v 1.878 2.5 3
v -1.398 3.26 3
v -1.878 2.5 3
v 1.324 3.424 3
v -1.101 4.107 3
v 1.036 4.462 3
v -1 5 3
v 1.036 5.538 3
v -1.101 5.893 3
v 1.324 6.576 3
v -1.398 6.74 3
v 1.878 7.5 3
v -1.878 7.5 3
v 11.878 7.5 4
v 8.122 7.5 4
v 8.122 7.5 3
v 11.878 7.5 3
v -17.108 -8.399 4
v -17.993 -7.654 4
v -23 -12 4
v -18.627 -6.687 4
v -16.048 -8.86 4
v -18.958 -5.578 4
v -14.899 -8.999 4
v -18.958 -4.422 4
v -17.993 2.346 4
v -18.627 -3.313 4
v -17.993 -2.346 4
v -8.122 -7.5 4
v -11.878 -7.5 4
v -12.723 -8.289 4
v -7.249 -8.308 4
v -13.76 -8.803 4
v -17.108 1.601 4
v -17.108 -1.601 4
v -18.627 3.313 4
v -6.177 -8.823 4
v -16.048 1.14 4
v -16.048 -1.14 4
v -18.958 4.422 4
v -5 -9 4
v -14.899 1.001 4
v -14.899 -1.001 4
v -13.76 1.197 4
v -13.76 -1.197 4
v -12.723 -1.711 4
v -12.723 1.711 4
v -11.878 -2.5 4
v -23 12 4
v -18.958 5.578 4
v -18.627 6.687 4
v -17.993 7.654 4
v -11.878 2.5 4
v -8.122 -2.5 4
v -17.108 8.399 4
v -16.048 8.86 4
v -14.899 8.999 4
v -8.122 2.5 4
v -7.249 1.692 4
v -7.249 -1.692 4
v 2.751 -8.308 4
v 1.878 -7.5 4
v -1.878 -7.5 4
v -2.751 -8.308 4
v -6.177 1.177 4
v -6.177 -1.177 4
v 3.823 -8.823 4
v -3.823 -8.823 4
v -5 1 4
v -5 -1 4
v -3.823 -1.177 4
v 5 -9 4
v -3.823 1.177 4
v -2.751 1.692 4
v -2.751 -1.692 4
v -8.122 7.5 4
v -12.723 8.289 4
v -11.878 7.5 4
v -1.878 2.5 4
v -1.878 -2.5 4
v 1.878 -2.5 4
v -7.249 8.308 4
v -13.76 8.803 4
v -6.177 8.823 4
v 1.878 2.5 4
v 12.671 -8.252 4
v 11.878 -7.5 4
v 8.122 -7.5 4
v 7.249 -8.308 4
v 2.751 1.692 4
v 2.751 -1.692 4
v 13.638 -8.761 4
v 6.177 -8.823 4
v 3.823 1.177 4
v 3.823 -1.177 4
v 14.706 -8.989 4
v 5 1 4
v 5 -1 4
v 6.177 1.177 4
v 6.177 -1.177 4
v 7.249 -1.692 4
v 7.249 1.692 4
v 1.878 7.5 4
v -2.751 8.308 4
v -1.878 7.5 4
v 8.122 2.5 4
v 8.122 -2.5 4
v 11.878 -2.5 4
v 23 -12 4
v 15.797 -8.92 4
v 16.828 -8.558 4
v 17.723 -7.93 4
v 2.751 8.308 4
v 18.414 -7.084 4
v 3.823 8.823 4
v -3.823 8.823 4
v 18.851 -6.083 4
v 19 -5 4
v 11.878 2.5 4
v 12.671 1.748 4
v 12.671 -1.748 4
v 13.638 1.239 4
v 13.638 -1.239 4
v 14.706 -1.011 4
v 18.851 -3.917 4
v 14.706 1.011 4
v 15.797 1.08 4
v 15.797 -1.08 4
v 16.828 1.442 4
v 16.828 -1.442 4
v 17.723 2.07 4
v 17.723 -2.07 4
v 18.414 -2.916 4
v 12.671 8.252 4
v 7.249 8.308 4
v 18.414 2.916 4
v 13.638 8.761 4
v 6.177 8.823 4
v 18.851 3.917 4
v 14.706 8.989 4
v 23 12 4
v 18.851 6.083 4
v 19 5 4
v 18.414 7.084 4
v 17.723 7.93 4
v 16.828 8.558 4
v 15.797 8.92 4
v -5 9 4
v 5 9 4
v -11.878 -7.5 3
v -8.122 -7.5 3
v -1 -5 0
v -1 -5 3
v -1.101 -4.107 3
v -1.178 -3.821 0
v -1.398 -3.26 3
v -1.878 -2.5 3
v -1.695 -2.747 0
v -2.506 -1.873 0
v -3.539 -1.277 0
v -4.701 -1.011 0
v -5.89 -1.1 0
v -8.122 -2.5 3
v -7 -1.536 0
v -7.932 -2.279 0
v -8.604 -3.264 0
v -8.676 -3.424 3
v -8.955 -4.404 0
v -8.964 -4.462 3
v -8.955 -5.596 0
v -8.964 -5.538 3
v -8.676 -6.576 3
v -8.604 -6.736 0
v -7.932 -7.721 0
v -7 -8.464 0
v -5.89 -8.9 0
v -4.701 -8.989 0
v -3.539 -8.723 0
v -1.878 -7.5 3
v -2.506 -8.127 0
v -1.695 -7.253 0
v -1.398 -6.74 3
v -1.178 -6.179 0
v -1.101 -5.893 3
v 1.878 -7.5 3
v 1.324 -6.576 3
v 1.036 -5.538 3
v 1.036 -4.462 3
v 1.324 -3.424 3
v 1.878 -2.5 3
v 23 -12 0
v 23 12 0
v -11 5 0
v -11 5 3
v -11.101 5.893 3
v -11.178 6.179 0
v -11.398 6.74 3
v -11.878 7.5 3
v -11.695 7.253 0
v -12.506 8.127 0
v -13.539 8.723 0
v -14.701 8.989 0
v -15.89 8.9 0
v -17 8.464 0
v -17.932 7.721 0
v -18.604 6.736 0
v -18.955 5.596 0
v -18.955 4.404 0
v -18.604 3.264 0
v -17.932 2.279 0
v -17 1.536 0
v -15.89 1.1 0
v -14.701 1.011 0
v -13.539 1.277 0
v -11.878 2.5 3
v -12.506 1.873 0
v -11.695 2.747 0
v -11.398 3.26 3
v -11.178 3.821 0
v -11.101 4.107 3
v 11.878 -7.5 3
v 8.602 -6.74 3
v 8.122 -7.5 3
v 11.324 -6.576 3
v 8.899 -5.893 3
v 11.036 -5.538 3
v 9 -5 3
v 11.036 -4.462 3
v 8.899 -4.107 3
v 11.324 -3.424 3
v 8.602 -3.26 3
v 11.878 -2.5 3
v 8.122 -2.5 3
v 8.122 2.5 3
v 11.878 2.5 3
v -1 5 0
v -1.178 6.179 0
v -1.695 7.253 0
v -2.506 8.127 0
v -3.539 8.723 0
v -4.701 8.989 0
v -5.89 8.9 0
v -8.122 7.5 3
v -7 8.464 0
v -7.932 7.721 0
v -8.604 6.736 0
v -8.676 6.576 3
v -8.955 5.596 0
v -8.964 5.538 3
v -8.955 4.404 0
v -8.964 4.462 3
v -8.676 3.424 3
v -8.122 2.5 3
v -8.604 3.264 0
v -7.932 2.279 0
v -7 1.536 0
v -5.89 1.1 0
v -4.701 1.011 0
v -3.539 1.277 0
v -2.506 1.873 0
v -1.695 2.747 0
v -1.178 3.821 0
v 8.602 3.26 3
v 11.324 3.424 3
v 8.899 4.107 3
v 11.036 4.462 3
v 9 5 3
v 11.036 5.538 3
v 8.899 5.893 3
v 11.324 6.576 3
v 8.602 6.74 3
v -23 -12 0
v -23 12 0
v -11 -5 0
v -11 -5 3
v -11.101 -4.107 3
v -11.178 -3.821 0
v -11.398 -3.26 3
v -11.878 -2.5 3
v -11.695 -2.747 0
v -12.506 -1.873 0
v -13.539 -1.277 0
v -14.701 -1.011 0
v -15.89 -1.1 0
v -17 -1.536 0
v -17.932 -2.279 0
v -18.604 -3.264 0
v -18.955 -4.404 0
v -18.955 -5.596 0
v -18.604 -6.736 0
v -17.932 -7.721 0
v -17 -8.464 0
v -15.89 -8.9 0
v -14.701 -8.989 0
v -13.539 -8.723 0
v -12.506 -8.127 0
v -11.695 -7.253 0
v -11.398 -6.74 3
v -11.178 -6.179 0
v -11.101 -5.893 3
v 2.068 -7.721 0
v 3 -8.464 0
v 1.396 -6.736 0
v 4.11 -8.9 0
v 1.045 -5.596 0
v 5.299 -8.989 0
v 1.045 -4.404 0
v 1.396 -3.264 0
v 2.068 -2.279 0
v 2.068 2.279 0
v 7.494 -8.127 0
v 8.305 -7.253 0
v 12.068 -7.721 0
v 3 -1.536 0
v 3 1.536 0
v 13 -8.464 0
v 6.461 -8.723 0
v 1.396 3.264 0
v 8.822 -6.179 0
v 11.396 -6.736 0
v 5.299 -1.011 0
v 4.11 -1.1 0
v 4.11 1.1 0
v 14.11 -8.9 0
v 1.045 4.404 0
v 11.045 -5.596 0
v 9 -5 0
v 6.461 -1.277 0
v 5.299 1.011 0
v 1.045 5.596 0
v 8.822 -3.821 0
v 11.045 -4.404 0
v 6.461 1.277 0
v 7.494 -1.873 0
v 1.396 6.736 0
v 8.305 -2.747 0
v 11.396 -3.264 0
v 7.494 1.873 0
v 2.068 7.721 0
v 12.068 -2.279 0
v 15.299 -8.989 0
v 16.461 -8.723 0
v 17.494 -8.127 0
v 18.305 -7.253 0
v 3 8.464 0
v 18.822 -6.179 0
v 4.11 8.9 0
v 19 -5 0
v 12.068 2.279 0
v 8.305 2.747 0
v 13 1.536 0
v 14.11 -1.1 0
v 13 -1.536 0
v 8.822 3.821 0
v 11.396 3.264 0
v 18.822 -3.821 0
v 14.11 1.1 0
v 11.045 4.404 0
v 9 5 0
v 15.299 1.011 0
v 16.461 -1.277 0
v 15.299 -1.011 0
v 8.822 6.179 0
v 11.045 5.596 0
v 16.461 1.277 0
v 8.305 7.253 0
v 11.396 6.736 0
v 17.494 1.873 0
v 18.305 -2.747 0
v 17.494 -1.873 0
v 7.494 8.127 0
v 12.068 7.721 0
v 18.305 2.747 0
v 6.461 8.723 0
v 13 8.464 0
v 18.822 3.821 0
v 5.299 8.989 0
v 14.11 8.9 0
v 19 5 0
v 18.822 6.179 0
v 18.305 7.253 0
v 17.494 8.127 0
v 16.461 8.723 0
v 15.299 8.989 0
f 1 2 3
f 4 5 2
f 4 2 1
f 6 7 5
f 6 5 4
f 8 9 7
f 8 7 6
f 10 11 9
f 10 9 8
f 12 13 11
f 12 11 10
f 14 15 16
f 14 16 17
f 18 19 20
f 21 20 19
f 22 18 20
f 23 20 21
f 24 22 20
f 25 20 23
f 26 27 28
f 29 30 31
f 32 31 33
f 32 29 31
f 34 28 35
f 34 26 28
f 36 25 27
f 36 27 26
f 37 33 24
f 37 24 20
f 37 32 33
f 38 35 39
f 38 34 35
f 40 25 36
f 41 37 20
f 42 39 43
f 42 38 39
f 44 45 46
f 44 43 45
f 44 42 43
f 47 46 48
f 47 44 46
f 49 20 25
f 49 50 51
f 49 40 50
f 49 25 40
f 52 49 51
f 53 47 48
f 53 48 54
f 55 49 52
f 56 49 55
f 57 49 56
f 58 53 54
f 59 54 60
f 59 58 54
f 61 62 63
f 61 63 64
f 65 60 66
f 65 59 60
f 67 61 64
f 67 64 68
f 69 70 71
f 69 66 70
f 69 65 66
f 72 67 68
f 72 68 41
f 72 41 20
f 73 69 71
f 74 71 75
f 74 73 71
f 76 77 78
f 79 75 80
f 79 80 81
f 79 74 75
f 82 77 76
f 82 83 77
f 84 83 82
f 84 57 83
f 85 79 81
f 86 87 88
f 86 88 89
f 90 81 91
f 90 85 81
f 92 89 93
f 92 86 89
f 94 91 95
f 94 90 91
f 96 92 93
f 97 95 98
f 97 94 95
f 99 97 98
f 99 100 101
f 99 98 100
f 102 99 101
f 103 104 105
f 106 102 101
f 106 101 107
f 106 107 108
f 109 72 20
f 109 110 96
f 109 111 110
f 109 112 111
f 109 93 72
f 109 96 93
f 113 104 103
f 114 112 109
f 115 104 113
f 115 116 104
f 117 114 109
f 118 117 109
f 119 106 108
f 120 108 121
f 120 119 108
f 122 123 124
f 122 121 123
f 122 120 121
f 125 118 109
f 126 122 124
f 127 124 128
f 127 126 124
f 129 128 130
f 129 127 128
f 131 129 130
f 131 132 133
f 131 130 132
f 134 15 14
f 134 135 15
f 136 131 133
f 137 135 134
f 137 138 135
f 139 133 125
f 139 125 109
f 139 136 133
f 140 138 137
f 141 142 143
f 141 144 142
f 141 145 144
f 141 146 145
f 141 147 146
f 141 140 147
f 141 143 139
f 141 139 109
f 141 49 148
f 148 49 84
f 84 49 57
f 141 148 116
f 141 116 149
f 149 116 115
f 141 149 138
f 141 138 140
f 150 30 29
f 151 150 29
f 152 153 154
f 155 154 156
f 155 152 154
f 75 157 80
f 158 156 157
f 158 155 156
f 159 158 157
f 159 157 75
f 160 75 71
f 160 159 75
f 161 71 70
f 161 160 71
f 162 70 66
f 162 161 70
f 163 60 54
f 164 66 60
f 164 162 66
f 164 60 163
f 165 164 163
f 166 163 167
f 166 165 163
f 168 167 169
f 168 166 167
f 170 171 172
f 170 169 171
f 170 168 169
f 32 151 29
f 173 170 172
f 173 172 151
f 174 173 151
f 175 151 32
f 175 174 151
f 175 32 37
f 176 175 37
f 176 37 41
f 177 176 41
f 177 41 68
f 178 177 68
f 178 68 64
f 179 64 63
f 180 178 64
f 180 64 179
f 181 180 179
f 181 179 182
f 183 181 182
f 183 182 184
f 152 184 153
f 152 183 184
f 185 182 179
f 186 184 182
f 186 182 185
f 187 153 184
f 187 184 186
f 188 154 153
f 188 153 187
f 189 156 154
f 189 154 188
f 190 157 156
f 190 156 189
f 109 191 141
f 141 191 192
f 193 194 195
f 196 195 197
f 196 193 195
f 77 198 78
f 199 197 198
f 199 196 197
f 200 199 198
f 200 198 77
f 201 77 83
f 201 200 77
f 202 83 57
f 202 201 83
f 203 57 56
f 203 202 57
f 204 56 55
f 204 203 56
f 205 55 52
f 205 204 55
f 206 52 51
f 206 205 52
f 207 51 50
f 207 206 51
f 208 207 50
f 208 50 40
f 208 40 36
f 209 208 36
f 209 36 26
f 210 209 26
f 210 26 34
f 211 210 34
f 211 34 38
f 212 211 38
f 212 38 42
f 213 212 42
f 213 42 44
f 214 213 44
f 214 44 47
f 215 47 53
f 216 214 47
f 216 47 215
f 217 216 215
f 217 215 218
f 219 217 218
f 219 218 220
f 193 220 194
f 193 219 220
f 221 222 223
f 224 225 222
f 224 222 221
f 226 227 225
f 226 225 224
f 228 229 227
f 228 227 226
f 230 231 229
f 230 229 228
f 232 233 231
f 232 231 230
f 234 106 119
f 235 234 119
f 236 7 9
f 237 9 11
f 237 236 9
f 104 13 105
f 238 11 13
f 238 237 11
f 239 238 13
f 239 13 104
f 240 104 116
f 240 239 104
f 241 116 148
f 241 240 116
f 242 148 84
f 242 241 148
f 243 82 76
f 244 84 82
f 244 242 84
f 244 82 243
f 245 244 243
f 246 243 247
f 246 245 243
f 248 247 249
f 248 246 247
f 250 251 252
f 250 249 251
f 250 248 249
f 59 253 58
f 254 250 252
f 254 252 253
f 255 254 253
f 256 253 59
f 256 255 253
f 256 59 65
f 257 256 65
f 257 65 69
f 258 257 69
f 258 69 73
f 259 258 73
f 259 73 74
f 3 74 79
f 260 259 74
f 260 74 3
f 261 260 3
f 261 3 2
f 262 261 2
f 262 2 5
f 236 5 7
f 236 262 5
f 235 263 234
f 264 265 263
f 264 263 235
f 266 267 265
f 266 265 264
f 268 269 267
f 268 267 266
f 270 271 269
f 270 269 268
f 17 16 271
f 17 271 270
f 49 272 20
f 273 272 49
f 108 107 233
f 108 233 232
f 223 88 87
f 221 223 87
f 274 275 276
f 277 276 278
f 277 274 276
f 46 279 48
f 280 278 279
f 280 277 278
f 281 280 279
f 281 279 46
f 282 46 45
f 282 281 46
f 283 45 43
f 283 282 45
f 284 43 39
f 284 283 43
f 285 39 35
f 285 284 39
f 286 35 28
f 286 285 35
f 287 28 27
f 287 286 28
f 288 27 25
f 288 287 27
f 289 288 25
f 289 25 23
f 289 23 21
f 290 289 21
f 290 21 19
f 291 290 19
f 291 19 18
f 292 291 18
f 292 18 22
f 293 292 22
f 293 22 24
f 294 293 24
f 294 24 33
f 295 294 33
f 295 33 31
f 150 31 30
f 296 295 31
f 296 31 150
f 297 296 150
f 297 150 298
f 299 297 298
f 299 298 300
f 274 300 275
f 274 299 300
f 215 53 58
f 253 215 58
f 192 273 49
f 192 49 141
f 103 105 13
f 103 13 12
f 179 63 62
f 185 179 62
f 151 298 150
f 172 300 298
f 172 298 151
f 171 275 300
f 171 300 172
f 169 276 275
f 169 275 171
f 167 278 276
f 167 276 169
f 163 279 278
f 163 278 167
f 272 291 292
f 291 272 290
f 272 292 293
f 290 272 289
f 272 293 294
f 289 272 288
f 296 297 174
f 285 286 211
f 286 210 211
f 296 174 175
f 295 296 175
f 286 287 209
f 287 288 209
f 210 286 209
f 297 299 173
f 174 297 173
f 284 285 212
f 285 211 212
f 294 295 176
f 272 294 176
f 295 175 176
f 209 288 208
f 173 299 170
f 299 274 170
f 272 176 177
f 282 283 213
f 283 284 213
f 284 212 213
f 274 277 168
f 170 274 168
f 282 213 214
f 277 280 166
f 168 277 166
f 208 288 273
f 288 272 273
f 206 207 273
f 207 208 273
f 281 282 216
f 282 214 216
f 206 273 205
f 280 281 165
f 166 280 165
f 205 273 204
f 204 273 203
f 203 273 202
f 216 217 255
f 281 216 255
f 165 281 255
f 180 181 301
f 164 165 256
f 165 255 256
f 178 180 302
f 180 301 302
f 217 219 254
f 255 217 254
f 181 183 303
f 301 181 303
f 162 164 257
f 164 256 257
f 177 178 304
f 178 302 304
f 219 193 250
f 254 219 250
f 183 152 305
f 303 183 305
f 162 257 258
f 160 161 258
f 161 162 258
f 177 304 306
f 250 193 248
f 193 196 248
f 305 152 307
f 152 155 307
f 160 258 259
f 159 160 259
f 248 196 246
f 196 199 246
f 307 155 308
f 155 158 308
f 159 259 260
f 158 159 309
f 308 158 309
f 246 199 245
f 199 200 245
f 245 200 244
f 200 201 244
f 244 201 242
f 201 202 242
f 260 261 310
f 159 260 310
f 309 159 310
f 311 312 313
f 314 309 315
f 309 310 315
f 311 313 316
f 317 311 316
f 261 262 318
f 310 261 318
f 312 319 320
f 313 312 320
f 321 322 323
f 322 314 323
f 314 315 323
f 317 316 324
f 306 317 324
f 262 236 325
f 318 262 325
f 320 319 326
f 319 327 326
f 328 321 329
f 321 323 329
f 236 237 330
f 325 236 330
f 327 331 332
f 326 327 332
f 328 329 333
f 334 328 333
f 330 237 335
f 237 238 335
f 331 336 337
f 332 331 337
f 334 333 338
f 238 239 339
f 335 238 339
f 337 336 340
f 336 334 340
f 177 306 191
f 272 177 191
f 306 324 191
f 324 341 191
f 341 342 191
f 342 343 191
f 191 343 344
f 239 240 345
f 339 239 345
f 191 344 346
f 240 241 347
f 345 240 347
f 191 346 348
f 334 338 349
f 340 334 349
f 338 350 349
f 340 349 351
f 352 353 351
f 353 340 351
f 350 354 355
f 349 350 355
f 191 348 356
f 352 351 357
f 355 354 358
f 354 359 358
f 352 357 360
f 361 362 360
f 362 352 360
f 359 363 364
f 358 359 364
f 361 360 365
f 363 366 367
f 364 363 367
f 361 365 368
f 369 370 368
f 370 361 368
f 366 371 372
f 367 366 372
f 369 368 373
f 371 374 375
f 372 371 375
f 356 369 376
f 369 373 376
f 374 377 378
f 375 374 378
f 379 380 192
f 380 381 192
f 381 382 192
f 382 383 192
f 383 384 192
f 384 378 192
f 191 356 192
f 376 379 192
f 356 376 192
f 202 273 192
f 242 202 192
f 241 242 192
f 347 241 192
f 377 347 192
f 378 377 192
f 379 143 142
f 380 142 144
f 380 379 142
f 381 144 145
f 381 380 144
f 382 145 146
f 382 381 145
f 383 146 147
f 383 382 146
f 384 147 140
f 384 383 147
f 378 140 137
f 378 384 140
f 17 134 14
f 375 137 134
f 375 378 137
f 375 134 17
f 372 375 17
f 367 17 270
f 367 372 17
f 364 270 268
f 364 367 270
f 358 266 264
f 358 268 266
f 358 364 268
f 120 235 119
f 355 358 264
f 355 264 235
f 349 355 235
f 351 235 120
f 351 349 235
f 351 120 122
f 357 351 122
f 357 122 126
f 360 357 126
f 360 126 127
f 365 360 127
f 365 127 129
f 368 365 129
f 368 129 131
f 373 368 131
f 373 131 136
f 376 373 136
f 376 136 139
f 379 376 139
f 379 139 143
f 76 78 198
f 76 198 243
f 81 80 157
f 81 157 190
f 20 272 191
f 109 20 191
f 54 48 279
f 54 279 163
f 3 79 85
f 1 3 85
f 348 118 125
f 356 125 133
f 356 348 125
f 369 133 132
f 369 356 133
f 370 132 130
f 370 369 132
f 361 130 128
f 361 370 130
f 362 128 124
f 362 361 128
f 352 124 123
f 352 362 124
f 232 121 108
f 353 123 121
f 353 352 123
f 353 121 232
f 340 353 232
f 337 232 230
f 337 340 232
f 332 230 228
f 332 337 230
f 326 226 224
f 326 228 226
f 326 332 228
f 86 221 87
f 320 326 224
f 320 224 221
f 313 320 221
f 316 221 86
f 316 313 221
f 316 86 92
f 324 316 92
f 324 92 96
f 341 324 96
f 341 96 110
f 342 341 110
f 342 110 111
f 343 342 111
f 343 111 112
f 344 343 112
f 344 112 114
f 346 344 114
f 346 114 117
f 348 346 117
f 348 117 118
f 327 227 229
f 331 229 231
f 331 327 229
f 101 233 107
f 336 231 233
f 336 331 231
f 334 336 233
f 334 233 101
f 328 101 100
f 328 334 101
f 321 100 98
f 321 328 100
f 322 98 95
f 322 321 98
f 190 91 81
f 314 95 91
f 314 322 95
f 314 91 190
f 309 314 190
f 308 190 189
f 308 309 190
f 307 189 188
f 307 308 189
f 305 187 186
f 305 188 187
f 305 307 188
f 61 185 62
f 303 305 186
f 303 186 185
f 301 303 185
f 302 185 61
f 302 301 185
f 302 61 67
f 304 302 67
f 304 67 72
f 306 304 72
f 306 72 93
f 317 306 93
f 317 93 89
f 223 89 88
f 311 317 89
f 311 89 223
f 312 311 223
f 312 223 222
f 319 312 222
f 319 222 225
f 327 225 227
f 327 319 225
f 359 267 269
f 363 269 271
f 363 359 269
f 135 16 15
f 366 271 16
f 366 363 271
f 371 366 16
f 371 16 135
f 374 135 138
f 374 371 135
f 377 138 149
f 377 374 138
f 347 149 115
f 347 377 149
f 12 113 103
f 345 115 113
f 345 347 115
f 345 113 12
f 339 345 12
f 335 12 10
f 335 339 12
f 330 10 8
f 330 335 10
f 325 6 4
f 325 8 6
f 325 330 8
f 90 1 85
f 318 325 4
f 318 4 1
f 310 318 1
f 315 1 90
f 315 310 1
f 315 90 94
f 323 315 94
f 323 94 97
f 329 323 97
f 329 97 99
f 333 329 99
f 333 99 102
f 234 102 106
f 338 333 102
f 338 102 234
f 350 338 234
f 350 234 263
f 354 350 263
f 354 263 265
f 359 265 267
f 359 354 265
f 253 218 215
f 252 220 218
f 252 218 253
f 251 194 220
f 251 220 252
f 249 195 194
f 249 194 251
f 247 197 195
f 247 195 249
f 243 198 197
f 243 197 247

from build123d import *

# Parameters (mm, degrees)
SKICA1_W                 = 46
SKICA1_H                 = 24
SKICA1_R                 = 4
P_IDAT_VYSUNUT_M1_DEPTH  = 4
SKICA2_W                 = 30
SKICA2_H                 = 5
ODEBRAT_VYSUNUT_M1_DEPTH = 1


with BuildPart() as part:
    # Skica1 → Přidat vysunutím1 (new body)
    with BuildSketch(Plane.XY):
        Rectangle(SKICA1_W, SKICA1_H)
        with Locations((-15, -5)):
            Circle(SKICA1_R, mode=Mode.SUBTRACT)
        with Locations((-5, -5)):
            Circle(SKICA1_R, mode=Mode.SUBTRACT)
        with Locations((5, -5)):
            Circle(SKICA1_R, mode=Mode.SUBTRACT)
        with Locations((15, -5)):
            Circle(SKICA1_R, mode=Mode.SUBTRACT)
        with Locations((-5, 5)):
            Circle(SKICA1_R, mode=Mode.SUBTRACT)
        with Locations((5, 5)):
            Circle(SKICA1_R, mode=Mode.SUBTRACT)
        with Locations((15, 5)):
            Circle(SKICA1_R, mode=Mode.SUBTRACT)
        with Locations((-15, 5)):
            Circle(SKICA1_R, mode=Mode.SUBTRACT)
    extrude(amount=P_IDAT_VYSUNUT_M1_DEPTH)

    # Skica2 → Odebrat vysunutím1 (cut)
    with BuildSketch(Plane.XY.offset(4)):
        with Locations((0, 5)):
            Rectangle(SKICA2_W, SKICA2_H)
        with Locations((0, -5)):
            Rectangle(SKICA2_W, SKICA2_H)
    extrude(amount=-ODEBRAT_VYSUNUT_M1_DEPTH, mode=Mode.SUBTRACT)


solid = part.part
